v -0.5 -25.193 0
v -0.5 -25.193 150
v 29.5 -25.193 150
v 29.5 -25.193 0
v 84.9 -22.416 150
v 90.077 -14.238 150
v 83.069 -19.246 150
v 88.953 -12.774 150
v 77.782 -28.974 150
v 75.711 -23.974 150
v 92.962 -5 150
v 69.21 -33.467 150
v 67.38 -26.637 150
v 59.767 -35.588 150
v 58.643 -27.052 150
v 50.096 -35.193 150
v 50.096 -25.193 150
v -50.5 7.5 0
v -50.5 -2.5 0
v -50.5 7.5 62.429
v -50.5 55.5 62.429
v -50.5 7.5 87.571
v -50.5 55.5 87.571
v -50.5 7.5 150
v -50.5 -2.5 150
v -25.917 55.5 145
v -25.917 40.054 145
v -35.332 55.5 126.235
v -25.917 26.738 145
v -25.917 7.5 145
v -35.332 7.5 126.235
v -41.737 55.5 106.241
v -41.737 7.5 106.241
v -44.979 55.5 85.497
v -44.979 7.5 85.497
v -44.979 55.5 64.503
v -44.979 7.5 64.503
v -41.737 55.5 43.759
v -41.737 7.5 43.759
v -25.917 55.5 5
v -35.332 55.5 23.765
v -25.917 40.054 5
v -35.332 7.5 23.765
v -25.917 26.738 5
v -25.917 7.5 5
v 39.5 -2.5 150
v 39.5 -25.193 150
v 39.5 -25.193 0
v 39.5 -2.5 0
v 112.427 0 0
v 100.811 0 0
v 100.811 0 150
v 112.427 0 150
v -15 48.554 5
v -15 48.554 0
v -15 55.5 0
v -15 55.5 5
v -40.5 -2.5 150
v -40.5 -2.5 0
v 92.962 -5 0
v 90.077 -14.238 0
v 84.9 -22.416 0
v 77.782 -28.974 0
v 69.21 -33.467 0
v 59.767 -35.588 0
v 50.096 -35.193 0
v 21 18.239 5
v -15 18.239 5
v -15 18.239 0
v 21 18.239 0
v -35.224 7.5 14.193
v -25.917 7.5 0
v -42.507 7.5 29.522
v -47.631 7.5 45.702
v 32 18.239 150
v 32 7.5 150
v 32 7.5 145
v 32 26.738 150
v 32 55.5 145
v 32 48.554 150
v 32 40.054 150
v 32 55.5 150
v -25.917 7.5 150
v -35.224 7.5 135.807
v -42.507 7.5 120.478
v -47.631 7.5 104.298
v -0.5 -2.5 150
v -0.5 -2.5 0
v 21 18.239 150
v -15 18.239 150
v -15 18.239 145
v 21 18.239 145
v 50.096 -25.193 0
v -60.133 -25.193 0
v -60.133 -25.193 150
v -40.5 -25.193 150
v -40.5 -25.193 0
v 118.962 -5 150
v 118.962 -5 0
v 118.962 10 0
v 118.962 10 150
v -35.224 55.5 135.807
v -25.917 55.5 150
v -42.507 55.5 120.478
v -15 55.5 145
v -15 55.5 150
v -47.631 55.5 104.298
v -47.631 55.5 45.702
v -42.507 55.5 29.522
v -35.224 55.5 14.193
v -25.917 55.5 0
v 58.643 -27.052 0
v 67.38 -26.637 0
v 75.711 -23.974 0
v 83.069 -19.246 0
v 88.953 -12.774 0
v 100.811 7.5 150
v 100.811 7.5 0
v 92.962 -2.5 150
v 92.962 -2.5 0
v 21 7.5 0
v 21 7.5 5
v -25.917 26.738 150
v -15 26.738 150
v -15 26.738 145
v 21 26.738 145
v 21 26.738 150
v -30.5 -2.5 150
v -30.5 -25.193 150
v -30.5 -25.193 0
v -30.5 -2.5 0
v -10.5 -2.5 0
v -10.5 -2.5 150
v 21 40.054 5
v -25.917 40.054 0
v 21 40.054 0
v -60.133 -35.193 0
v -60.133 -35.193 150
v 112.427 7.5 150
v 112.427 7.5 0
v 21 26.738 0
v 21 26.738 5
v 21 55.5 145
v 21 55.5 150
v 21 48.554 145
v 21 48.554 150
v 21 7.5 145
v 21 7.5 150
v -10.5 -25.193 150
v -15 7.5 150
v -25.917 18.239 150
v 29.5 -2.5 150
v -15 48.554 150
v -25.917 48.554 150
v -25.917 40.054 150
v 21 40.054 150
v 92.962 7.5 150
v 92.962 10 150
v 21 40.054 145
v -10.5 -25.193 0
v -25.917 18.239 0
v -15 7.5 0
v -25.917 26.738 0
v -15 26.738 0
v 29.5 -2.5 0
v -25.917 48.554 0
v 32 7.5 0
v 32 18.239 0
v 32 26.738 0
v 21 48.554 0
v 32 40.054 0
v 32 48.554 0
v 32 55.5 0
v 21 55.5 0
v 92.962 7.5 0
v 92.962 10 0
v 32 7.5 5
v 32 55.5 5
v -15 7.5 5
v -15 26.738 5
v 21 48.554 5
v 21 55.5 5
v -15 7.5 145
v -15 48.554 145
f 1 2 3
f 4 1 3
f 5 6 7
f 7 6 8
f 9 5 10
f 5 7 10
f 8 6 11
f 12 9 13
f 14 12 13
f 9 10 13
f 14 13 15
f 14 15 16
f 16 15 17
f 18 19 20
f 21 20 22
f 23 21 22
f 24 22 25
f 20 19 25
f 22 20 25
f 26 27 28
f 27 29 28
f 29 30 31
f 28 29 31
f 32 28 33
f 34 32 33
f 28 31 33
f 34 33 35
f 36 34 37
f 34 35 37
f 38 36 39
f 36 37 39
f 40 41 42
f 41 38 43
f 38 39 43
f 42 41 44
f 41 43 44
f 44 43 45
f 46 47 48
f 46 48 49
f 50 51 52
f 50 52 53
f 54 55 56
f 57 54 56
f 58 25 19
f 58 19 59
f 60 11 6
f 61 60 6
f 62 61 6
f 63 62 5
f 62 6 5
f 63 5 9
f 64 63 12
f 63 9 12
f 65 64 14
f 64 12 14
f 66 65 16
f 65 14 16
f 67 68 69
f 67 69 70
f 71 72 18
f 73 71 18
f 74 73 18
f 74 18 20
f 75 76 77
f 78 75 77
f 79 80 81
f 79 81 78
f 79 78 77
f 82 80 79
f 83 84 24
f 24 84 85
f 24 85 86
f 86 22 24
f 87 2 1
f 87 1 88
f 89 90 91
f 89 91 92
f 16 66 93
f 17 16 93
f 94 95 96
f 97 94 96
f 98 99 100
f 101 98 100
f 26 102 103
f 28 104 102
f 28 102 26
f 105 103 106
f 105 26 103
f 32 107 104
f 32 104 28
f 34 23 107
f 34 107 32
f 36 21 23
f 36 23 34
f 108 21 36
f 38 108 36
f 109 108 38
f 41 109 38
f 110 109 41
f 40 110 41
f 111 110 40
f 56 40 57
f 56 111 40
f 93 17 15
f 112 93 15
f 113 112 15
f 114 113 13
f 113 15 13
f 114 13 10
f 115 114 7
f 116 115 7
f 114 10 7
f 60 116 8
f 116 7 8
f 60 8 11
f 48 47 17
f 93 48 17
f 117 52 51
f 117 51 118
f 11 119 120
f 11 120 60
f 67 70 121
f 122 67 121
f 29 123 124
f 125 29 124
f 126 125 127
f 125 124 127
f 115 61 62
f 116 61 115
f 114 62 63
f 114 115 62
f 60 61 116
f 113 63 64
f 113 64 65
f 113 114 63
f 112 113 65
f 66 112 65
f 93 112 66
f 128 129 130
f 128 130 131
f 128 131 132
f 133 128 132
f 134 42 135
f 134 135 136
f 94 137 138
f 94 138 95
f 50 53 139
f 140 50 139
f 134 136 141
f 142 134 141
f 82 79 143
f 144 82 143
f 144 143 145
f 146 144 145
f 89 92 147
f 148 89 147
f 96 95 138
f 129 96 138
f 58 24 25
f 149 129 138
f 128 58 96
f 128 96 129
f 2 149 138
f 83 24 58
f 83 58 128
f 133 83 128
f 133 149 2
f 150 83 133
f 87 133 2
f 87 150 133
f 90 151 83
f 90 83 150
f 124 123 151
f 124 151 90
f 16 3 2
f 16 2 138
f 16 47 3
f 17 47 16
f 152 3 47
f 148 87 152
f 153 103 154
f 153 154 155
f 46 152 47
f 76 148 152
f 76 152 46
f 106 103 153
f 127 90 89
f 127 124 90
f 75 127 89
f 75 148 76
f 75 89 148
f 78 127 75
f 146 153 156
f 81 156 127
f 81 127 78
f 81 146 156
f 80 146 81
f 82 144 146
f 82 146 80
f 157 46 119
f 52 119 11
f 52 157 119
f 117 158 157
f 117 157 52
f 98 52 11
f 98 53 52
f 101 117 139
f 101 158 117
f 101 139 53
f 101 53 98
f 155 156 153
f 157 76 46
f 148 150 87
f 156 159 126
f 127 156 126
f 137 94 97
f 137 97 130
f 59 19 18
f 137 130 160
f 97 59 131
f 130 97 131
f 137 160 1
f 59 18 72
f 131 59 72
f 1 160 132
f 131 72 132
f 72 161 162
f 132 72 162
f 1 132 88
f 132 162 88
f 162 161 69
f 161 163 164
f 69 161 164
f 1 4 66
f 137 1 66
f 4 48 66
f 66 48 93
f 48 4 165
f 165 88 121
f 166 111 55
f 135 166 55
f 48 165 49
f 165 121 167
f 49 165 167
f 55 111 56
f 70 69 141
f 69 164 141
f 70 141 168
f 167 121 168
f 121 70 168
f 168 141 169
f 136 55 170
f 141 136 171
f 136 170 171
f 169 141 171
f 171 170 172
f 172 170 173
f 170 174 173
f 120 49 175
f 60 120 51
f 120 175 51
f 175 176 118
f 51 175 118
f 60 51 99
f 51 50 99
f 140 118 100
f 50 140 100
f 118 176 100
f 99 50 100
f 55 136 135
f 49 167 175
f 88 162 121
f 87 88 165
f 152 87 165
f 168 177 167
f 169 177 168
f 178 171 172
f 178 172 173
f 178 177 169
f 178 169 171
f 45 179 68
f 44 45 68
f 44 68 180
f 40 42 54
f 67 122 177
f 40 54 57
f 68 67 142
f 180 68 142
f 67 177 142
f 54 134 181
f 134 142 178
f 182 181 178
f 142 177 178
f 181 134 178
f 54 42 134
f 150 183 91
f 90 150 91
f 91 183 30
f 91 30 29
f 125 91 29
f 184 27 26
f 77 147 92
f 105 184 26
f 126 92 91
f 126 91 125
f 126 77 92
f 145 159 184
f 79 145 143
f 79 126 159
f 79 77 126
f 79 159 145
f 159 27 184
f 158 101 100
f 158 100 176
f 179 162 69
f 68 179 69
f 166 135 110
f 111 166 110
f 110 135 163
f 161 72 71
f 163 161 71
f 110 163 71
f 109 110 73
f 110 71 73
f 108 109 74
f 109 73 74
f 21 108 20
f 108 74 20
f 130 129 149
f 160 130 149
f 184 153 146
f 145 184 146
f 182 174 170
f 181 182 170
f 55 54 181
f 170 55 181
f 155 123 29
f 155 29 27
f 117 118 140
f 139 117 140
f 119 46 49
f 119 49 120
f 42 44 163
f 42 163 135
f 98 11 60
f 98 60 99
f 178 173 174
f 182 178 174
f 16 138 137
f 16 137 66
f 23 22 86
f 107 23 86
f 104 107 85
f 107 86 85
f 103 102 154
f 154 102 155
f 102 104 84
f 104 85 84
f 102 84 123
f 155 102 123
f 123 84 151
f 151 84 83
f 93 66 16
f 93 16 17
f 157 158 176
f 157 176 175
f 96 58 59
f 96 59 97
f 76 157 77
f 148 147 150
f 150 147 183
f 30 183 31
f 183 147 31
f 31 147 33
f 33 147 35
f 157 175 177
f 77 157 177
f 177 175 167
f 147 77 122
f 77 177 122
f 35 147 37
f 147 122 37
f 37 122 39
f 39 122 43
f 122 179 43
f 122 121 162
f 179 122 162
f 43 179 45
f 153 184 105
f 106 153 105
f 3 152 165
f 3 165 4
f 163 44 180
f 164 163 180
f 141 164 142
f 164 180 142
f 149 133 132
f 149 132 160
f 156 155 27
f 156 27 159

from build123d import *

# Parameters (mm, degrees)
BOSS_EXTRUDE4_DEPTH  = 150
SKETCH4_W            = 134.576159563
SKETCH4_H            = 10
BOSS_EXTRUDE5_DEPTH  = 150
SKETCH6_W            = 11.616097845
SKETCH6_H            = 7.5
CUT_EXTRUDE2_DEPTH   = 150
SKETCH9_W            = 24.346346268
SKETCH9_H            = 10
CUT_EXTRUDE3_DEPTH   = 150
BOSS_EXTRUDE8_DEPTH  = 150
SKETCH11_W           = 140
SKETCH11_H           = 48
CUT_EXTRUDE5_DEPTH   = 150
SKETCH12_W           = 57.917424305
SKETCH12_H           = 8.499583788
SKETCH12_H_2         = 8.499583789
BOSS_EXTRUDE9_DEPTH  = 150
SKETCH13_W           = 140
SKETCH13_H           = 30.315182179
CUT_EXTRUDE6_DEPTH   = 150
BOSS_EXTRUDE10_DEPTH = 48
SKETCH17_W           = 10.917424305
SKETCH17_H           = 13.316014602
CUT_EXTRUDE7_DEPTH   = 150


with BuildPart() as part:
    # Sketch1 → Boss-Extrude4 (new body)
    with BuildSketch(Plane.XY):
        Polygon((-25.917424305, 7.5), (-50.5, 7.5), (-50.5, -2.5), (-40.5, -2.5), (-40.5, -27.5), (-30.5, -27.5), (-30.5, -2.5), (-10.5, -2.5), (-10.5, -27.5), (-0.5, -27.5), (-0.5, -2.5), (29.5, -2.5), (29.5, -27.5), (39.5, -27.5), (39.5, -2.5), (92.961651585, -2.5), (92.961651585, -5), (118.961651585, -5), (118.961651585, 10), (92.961651585, 10), (92.961651585, 7.5), (32, 7.5), (32, 55.5), (21, 55.5), (21, 7.5), (-15, 7.5), (-15, 55.5), (-25.917424305, 55.5), align=None)
    extrude(amount=BOSS_EXTRUDE4_DEPTH)

    # Sketch4 → Boss-Extrude5 (add)
    with BuildSketch(Plane.XY.offset(150)):
        with Locations((7.154745881, -30.19267984)):
            Rectangle(SKETCH4_W, SKETCH4_H)
    extrude(amount=-BOSS_EXTRUDE5_DEPTH)

    # Sketch6 → Cut-Extrude2 (cut)
    with BuildSketch(Plane.XY.offset(150)):
        with Locations((106.618711588, 3.75)):
            Rectangle(SKETCH6_W, SKETCH6_H)
    extrude(amount=-CUT_EXTRUDE2_DEPTH, mode=Mode.SUBTRACT)

    # Sketch9 → Cut-Extrude3 (cut)
    with BuildSketch(Plane.XY.offset(150)):
        with Locations((62.269652528, -30.19267984)):
            Rectangle(SKETCH9_W, SKETCH9_H)
    extrude(amount=-CUT_EXTRUDE3_DEPTH, mode=Mode.SUBTRACT)

    # Sketch11 → Cut-Extrude5 (cut)
    with BuildSketch(Plane(origin=(32, 0, 0), x_dir=(0, 0, -1), z_dir=(1, 0, 0))):
        with Locations((-75, 31.5)):
            Rectangle(SKETCH11_W, SKETCH11_H)
    extrude(amount=-CUT_EXTRUDE5_DEPTH, mode=Mode.SUBTRACT)

    # Sketch12 → Boss-Extrude9 (add)
    with BuildSketch(Plane.XY.offset(150)):
        with Locations((3.041287847, 44.304242043)):
            Rectangle(SKETCH12_W, SKETCH12_H)
        with Locations((3.041287847, 22.488643653)):
            Rectangle(SKETCH12_W, SKETCH12_H_2)
    extrude(amount=-BOSS_EXTRUDE9_DEPTH)

    # Sketch13 → Cut-Extrude6 (cut)
    with BuildSketch(Plane(origin=(32, 0, 0), x_dir=(0, 0, -1), z_dir=(1, 0, 0))):
        with Locations((-75, 33.396442847)):
            Rectangle(SKETCH13_W, SKETCH13_H)
    extrude(amount=-CUT_EXTRUDE6_DEPTH, mode=Mode.SUBTRACT)

    # Sketch16 → Boss-Extrude10 (add)
    with BuildSketch(Plane(origin=(0, 7.5, 0), x_dir=(1, 0, 0), z_dir=(0, 1, 0))):
        with BuildLine():
            Line((-25.917424305, -150), (-25.917424305, -145))
            ThreePointArc((-25.917424305, -145), (-45.385865108, -75), (-25.917424305, -5))
            Line((-25.917424305, -5), (-25.917424305, 0))
            ThreePointArc((-25.917424305, 0), (-42.506880721, -29.52217094), (-50.5, -62.429293047))
            Line((-50.5, -62.429293047), (-50.5, -87.570706953))
            ThreePointArc((-50.5, -87.570706953), (-42.506880721, -120.47782906), (-25.917424305, -150))
        make_face()
    extrude(amount=BOSS_EXTRUDE10_DEPTH)

    # Sketch17 → Cut-Extrude7 (cut)
    with BuildSketch(Plane.XY.offset(150)):
        with Locations((-20.458712153, 33.396442848)):
            Rectangle(SKETCH17_W, SKETCH17_H)
    extrude(amount=-CUT_EXTRUDE7_DEPTH, mode=Mode.SUBTRACT)


with BuildPart() as body_2:
    # Sketch10 → Boss-Extrude8 (new body)
    with BuildSketch(Plane.XY.offset(150)):
        with BuildLine():
            Line((50.096479394, -35.19267984), (50.096479394, -25.19267984))
            ThreePointArc((50.096479394, -25.19267984), (75.711106415, -23.974007757), (92.961651585, -5))
            ThreePointArc((92.961651585, -5), (77.782174226, -28.974007757), (50.096479394, -35.19267984))
        make_face()
    extrude(amount=-BOSS_EXTRUDE8_DEPTH)


solid = Compound([part.part, body_2.part])
